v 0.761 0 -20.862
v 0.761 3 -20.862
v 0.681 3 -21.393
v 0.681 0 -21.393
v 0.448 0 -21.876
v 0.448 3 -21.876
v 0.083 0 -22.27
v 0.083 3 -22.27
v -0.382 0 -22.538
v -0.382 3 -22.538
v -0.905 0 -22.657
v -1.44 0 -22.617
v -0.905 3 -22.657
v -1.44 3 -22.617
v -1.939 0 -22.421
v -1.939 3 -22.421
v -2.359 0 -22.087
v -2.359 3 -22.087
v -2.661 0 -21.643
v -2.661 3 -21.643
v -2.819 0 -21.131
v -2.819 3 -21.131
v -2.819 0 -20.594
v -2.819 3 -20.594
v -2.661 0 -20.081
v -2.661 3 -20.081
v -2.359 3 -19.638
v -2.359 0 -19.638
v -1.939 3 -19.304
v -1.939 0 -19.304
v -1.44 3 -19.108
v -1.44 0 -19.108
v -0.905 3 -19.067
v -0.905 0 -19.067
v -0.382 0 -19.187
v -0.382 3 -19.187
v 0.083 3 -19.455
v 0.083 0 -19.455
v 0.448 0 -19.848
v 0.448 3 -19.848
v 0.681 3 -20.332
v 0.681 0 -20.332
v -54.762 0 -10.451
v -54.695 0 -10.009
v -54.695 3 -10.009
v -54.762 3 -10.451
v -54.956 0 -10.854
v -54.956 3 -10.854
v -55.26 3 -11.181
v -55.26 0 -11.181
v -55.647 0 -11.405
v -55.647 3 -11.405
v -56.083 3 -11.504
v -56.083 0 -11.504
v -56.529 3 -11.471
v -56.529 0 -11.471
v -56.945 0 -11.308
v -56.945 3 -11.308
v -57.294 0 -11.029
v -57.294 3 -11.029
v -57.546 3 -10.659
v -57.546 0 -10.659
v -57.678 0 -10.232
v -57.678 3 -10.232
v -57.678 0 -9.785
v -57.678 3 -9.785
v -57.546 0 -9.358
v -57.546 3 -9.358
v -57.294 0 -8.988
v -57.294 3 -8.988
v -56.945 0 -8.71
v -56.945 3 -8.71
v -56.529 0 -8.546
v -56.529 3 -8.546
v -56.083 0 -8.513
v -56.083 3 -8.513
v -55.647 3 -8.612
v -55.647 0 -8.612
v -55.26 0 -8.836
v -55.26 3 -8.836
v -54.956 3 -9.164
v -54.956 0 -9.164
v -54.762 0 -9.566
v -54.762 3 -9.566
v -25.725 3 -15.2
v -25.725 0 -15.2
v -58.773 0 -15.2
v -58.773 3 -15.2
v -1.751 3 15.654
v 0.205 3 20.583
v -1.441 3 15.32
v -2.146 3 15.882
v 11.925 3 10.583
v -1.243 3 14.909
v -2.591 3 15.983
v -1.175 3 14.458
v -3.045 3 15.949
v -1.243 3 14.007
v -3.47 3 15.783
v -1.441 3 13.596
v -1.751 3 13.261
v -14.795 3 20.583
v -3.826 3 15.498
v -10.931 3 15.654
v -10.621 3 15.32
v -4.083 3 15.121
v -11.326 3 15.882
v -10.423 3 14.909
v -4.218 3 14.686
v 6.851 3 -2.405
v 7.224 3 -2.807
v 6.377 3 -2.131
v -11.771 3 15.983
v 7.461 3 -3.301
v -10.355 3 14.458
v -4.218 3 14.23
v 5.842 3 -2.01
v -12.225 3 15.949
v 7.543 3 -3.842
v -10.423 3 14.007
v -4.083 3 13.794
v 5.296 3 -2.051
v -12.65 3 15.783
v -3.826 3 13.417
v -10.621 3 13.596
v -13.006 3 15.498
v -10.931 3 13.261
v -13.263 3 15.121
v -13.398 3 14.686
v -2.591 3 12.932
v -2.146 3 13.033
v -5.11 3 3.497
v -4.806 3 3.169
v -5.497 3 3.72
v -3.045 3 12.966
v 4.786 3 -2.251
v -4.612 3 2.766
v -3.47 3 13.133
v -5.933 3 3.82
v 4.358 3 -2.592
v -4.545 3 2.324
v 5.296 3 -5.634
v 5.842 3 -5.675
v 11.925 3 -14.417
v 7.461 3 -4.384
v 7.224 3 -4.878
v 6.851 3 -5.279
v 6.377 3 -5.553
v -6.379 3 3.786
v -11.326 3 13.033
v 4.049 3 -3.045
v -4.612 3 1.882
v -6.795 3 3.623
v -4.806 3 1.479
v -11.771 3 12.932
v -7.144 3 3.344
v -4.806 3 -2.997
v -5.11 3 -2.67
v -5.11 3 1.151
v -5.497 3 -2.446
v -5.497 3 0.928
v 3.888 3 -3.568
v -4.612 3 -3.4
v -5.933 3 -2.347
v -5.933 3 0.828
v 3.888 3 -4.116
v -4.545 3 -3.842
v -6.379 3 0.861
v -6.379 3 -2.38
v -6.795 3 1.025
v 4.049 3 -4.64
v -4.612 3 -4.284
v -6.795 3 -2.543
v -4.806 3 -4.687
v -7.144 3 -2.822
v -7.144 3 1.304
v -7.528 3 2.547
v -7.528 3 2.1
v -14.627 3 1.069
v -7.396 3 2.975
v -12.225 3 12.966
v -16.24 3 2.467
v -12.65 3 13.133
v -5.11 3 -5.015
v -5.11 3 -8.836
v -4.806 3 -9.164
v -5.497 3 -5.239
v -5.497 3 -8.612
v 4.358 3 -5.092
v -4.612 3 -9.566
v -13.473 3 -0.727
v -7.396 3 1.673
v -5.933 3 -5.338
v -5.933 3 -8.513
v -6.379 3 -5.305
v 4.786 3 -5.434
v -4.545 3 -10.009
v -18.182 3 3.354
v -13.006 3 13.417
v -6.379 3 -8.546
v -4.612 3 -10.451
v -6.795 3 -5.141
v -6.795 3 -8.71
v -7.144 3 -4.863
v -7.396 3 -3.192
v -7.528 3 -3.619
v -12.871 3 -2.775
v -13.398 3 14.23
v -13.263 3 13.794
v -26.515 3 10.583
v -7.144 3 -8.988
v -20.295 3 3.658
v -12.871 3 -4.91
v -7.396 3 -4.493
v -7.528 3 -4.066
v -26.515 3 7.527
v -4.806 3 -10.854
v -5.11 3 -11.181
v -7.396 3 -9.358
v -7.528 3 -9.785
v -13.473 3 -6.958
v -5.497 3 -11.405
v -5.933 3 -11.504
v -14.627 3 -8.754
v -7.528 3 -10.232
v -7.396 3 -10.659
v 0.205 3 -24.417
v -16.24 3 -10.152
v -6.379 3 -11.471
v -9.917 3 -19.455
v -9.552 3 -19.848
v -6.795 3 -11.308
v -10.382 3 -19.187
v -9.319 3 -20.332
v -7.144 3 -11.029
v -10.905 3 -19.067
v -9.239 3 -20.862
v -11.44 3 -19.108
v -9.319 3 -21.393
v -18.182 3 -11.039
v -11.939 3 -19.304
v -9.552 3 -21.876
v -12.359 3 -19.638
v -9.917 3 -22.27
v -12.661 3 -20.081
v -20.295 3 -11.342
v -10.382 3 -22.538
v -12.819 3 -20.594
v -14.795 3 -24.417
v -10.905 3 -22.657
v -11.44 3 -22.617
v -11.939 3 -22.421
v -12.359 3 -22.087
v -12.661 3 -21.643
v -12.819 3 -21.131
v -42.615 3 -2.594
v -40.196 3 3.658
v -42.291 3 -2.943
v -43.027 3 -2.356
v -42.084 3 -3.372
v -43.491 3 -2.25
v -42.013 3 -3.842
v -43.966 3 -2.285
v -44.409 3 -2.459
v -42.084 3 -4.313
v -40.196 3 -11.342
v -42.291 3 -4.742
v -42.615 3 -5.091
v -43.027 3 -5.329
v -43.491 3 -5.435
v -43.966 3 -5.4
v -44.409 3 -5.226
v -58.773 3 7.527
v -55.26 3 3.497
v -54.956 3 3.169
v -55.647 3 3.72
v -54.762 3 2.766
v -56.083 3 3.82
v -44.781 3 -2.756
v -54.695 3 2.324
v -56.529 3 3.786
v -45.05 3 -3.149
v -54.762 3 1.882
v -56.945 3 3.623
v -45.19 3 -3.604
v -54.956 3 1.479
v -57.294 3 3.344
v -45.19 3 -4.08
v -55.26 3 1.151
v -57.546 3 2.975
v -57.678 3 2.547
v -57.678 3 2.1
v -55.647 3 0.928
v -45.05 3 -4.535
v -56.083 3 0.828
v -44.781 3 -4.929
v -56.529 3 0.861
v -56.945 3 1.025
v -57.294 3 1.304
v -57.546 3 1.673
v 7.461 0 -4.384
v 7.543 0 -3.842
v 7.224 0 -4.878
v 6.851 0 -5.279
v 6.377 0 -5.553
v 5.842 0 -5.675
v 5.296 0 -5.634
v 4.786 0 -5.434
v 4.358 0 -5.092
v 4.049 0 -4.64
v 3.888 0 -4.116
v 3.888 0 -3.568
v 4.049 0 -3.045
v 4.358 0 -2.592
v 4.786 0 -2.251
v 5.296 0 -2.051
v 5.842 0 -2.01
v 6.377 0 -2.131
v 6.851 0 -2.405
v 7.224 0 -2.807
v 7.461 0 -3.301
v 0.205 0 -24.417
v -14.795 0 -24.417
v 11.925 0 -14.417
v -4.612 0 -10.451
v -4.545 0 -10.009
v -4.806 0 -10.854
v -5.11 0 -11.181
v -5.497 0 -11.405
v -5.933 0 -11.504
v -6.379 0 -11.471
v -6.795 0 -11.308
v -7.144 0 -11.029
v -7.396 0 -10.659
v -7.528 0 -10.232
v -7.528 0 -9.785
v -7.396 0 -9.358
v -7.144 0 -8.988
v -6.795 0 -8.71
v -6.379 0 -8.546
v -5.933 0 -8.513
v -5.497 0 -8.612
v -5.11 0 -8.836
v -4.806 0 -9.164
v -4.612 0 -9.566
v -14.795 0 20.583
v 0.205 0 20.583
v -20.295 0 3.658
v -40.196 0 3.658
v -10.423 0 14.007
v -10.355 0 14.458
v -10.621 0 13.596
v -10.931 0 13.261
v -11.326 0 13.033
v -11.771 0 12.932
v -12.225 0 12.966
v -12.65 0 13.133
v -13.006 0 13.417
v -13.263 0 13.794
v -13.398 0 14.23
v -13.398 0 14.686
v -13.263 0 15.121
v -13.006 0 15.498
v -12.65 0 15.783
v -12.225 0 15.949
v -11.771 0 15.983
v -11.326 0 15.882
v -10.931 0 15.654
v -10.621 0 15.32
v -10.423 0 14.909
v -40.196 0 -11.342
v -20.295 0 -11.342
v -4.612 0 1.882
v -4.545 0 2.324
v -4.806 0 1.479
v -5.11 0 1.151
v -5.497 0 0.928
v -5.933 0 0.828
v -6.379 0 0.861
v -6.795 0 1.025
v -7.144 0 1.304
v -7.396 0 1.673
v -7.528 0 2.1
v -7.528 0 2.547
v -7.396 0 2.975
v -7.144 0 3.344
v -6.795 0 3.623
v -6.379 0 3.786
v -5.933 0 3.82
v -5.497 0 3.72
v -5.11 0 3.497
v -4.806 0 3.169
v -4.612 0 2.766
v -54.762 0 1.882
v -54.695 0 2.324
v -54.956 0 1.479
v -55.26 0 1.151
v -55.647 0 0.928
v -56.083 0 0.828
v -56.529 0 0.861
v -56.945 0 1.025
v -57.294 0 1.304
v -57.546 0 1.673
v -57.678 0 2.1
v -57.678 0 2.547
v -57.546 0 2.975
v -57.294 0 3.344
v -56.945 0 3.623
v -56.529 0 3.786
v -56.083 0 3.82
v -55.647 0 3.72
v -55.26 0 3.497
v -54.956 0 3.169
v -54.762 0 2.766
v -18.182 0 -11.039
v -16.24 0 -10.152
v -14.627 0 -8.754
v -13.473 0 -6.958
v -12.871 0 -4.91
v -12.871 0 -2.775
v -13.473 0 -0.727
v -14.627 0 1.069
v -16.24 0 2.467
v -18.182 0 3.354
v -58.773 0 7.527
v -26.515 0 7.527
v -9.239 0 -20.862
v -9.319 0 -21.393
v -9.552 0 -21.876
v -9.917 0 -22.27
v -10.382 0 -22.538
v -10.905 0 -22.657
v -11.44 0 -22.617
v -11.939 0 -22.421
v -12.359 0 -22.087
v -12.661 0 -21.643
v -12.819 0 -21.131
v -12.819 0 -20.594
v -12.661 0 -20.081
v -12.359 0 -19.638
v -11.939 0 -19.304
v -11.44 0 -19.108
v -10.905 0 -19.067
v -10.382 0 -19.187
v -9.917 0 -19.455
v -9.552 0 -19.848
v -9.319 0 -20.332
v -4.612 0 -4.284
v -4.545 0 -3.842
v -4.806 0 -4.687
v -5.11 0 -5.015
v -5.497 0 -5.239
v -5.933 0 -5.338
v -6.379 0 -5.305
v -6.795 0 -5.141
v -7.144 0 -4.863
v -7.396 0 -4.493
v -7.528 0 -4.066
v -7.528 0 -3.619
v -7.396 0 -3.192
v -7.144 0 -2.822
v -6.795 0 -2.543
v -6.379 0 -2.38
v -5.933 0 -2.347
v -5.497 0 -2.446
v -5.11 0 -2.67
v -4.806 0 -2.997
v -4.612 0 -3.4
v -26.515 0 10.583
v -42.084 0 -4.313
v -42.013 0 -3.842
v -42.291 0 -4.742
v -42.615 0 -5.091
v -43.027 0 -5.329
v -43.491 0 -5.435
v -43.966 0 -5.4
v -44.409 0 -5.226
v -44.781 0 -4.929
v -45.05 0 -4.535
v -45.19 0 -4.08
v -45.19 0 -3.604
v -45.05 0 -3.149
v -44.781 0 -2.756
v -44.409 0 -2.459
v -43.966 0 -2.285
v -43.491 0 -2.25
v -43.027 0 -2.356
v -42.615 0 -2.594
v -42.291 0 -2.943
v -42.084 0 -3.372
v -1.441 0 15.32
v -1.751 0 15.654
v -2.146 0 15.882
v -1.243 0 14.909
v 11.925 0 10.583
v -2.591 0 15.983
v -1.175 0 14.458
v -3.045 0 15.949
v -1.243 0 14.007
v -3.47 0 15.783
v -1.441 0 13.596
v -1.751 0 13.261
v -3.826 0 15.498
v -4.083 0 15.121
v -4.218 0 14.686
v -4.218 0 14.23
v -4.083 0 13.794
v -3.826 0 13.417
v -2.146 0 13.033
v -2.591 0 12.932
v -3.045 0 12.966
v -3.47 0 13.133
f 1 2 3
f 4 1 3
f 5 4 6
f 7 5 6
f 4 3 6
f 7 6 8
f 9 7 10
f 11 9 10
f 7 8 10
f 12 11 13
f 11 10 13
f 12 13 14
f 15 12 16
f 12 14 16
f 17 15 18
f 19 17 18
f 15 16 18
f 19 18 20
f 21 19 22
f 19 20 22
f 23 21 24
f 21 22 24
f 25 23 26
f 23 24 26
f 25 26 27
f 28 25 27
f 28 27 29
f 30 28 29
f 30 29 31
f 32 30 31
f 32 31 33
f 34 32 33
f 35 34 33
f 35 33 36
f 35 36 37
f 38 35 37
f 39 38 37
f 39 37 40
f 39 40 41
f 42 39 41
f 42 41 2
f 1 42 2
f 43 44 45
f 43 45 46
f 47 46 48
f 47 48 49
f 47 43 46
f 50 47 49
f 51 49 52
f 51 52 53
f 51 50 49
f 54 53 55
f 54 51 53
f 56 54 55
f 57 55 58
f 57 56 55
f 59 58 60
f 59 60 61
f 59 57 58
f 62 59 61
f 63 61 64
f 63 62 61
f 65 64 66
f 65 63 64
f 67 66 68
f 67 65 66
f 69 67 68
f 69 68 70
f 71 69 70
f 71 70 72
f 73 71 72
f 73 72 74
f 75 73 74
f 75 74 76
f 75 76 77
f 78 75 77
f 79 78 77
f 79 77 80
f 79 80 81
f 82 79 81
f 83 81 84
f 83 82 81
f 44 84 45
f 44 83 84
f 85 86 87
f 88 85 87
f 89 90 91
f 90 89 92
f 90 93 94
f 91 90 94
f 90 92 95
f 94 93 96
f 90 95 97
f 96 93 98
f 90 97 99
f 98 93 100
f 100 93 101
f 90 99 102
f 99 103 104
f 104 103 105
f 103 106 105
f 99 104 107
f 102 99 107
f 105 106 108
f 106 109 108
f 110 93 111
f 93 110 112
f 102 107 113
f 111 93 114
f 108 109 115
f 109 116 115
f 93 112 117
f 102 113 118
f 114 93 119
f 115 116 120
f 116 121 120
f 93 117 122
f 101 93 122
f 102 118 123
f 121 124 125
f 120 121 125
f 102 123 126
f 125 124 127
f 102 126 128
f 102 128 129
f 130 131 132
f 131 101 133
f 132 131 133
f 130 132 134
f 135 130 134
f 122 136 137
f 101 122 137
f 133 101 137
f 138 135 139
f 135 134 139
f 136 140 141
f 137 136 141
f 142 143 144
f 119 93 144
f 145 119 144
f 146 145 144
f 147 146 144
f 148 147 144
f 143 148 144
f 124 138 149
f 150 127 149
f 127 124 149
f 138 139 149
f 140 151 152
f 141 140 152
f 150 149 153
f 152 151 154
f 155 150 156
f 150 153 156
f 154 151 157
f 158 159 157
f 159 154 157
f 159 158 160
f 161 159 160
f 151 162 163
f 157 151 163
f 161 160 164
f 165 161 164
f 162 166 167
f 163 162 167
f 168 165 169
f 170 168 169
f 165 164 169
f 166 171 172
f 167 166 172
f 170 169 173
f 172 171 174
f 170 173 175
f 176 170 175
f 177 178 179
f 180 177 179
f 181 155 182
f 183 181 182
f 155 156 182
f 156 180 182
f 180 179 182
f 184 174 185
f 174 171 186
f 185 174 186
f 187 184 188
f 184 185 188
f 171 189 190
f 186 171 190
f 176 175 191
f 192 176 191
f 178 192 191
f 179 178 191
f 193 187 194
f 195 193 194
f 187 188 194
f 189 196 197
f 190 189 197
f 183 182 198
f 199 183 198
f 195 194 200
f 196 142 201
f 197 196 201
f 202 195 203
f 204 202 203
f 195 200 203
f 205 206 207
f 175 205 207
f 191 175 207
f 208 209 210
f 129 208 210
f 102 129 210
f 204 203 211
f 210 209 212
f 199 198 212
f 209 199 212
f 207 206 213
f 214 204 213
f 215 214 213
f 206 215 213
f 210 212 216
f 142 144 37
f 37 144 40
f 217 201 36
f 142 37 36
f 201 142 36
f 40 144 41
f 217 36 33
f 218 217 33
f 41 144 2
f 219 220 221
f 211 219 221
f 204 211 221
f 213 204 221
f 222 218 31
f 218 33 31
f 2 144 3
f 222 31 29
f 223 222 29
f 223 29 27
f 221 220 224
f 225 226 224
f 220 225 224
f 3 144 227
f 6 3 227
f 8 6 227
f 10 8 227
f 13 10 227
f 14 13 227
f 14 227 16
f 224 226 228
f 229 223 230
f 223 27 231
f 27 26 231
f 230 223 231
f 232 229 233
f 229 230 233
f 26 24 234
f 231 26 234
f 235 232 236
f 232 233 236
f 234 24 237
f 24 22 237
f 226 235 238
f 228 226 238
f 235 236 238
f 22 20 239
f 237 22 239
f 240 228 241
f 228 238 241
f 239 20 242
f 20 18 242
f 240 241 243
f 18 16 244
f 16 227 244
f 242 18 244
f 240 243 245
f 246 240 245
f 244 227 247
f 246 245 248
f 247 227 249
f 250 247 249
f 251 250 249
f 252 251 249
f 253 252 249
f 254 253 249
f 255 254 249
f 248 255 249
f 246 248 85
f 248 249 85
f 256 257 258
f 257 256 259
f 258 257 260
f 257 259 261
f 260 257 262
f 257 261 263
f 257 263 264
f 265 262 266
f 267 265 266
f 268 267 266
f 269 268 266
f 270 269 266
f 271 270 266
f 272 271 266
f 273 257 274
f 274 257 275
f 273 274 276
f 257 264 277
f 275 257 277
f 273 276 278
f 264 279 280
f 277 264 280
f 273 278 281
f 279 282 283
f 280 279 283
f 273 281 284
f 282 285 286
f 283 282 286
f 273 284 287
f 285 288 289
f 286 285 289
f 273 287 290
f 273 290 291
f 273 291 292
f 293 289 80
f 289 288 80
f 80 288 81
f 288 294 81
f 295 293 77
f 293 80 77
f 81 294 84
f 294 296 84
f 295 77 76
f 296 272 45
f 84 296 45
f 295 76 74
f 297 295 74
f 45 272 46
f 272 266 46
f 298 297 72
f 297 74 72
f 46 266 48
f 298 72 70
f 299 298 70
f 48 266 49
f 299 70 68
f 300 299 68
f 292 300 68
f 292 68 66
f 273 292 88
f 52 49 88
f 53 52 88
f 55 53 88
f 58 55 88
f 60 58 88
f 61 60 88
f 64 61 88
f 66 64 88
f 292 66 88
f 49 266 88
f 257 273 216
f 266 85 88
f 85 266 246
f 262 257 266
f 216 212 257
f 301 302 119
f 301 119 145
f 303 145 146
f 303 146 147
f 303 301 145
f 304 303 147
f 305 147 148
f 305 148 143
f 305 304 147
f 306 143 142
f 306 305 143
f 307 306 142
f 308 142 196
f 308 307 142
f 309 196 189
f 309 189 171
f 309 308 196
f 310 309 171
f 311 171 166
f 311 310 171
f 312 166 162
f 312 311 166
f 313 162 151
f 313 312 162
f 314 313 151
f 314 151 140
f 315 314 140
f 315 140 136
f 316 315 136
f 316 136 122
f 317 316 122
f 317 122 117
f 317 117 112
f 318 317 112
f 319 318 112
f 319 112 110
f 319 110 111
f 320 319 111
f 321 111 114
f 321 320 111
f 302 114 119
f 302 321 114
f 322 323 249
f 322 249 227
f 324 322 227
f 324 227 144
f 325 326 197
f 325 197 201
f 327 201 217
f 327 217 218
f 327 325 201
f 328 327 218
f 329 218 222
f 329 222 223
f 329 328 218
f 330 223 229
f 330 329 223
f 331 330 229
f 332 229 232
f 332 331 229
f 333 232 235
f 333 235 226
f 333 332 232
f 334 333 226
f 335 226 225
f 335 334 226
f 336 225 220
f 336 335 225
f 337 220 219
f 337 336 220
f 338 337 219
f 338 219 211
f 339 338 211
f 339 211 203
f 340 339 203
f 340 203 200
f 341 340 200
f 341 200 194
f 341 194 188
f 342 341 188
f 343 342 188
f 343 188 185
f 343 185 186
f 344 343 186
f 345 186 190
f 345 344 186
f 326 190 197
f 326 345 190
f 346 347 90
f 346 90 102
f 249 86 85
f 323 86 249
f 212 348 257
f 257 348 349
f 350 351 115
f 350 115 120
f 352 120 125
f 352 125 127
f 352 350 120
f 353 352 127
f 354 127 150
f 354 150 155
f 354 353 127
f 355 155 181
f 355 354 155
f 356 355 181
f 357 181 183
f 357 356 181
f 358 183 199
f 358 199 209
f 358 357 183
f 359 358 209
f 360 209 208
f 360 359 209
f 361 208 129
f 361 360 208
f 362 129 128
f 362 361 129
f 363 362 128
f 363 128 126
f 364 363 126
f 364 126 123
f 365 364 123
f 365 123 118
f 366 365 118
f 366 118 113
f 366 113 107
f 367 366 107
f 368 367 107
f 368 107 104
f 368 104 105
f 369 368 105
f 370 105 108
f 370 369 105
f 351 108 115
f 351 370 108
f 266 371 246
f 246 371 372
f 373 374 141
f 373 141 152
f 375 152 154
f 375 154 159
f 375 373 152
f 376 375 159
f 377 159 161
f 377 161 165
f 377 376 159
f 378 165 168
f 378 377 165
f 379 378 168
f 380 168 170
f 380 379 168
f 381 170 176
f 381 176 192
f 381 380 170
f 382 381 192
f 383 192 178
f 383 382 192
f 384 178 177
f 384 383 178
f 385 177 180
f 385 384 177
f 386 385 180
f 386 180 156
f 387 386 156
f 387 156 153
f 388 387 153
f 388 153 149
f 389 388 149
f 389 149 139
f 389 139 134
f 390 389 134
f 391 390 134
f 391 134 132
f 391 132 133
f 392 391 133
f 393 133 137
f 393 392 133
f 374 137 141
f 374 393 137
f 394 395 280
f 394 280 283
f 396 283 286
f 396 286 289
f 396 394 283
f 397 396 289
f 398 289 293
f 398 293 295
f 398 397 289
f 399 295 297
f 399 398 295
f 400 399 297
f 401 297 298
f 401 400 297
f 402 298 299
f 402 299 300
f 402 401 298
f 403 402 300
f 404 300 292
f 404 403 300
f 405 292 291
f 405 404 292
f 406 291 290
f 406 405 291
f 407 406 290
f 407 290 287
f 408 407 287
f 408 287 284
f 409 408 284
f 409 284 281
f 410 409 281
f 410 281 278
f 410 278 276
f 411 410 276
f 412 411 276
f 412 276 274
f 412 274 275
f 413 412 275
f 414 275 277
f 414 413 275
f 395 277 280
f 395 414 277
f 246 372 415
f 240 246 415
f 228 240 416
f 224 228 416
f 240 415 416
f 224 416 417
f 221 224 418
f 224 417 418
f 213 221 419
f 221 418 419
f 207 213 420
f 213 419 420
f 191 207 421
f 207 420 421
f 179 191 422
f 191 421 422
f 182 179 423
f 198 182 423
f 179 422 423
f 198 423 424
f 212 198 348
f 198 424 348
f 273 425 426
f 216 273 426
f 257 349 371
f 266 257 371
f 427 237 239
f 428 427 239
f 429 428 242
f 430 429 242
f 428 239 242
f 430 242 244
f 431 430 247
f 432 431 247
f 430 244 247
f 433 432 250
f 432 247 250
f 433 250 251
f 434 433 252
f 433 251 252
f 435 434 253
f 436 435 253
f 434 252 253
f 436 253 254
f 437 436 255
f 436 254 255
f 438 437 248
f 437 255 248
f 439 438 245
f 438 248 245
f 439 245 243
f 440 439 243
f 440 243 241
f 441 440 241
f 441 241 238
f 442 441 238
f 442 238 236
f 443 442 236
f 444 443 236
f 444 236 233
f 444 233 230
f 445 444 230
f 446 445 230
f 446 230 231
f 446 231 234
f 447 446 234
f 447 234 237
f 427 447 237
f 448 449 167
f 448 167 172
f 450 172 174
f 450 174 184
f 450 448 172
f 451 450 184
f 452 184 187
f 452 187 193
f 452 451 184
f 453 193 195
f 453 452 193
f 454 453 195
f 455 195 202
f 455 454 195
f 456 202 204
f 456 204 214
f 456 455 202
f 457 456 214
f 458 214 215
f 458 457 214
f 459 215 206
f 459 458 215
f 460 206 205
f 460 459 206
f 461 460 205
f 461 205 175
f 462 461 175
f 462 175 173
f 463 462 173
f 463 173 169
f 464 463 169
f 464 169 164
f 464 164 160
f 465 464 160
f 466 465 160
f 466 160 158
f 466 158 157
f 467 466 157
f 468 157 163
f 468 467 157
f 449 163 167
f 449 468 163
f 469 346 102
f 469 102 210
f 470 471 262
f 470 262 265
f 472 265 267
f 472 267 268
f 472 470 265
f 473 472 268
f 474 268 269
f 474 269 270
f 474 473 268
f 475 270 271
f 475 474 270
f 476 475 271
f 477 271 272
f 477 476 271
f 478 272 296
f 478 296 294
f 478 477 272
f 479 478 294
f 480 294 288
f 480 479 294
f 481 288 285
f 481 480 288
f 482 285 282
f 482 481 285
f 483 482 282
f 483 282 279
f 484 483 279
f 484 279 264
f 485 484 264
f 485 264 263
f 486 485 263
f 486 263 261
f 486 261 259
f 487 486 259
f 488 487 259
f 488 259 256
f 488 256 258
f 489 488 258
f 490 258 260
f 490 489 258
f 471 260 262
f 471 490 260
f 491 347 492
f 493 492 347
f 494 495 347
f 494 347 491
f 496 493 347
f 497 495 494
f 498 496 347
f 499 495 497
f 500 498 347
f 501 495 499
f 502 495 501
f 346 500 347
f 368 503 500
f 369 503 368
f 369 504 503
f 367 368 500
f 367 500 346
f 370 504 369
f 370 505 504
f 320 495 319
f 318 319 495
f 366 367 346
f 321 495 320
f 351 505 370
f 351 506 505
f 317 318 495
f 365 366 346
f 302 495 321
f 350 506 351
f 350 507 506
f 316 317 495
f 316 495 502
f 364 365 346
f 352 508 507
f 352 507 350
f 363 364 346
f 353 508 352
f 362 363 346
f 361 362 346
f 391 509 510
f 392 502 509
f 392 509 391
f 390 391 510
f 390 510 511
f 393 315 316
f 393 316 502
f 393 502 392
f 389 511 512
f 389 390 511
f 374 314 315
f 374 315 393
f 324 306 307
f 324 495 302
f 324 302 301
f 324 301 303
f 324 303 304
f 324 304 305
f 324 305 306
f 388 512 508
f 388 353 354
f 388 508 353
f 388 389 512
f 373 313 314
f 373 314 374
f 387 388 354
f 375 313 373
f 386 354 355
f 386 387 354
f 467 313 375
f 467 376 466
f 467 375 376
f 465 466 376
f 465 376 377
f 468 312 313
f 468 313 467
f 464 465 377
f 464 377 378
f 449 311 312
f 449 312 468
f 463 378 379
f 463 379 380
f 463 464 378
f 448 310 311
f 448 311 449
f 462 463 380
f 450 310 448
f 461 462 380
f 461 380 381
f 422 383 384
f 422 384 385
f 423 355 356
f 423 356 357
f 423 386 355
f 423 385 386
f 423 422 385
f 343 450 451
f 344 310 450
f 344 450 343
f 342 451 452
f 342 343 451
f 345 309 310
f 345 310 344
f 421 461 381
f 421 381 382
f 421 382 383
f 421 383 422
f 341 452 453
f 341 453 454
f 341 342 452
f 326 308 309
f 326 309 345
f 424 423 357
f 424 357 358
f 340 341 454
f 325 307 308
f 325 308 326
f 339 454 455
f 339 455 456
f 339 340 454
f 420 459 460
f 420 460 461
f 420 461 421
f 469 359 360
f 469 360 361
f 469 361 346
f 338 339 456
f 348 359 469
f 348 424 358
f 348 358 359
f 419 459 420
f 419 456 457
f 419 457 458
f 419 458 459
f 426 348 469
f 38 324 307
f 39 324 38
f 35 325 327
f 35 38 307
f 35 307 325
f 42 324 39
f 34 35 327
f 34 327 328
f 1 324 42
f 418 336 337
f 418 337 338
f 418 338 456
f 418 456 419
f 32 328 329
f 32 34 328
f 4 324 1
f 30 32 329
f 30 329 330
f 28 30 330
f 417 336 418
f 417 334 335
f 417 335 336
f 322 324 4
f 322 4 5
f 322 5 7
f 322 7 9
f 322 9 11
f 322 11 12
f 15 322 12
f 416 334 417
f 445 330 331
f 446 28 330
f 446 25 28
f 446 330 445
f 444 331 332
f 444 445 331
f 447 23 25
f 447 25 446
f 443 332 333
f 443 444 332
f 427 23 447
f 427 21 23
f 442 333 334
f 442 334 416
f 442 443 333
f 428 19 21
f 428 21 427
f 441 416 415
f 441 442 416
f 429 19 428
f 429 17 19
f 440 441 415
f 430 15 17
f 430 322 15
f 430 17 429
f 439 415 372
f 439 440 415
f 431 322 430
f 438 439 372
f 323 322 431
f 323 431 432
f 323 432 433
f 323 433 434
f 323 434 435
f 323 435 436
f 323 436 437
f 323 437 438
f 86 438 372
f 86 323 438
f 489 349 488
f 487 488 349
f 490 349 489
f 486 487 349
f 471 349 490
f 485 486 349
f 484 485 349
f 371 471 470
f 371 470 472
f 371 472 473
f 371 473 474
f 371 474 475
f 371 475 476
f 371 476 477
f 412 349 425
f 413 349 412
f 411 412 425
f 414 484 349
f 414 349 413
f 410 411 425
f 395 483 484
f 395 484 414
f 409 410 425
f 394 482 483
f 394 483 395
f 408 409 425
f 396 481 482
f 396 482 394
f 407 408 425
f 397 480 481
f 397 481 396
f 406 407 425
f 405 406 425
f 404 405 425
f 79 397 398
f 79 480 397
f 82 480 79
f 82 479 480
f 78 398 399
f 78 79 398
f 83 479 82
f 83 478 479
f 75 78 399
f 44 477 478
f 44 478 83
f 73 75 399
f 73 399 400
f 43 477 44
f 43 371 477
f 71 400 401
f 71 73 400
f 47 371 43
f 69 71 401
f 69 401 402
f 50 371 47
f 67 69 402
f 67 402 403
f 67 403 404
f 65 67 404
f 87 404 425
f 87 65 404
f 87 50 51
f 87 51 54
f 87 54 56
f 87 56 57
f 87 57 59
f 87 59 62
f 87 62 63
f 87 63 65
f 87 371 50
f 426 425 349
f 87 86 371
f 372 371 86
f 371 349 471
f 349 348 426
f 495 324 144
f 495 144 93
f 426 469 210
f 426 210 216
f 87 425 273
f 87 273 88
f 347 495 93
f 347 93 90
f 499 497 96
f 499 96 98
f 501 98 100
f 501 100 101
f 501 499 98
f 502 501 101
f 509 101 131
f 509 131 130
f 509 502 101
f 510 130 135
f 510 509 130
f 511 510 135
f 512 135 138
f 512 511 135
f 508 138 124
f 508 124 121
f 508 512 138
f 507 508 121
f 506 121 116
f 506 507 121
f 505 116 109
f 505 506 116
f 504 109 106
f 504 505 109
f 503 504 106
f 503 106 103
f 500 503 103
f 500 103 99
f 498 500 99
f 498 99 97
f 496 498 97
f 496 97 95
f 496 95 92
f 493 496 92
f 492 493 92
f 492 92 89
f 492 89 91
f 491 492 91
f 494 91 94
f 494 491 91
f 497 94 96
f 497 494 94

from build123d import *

# Parameters (mm, degrees)
CROQUIS1_R              = 1.53
CROQUIS1_R_2            = 1.837919526
CROQUIS1_R_3            = 1.597275243
CROQUIS1_R_4            = 1.5
SALIENTE_EXTRUIR1_DEPTH = 3
CROQUIS2_R              = 1.8
CORTAR_EXTRUIR1_DEPTH   = 10


with BuildPart() as part:
    # Croquis1 → Saliente-Extruir1 (new body)
    with BuildSketch(Plane(origin=(0, 0, 0), x_dir=(1, 0, 0), z_dir=(0, 1, 0))):
        Polygon((-26.514888395, -10.582637626), (-26.514888395, -7.527182045), (-40.886979894, -7.527182045), (-58.77250276, -7.527182045), (-58.77250276, 15.200062733), (-41.405808266, 15.200062733), (-25.724953766, 15.200062733), (-14.794888395, 24.417362374), (0.205111605, 24.417362374), (11.925111605, 14.417362374), (11.925111605, -10.582637626), (0.205111605, -20.582637626), (-14.794888395, -20.582637626), align=None)
        with Locations((-11.884888395, -14.457637626)):
            Circle(CROQUIS1_R, mode=Mode.SUBTRACT)
        with Locations((-2.704888395, -14.457637626)):
            Circle(CROQUIS1_R, mode=Mode.SUBTRACT)
        with Locations((5.705111605, 3.842362374)):
            Circle(CROQUIS1_R_2, mode=Mode.SUBTRACT)
        with Locations((-43.610544187, 3.842362374)):
            Circle(CROQUIS1_R_3, mode=Mode.SUBTRACT)
        with Locations((-6.044888395, 3.842362374)):
            Circle(CROQUIS1_R_4, mode=Mode.SUBTRACT)
        with Locations((-6.044888395, 10.008584025)):
            Circle(CROQUIS1_R_4, mode=Mode.SUBTRACT)
        with Locations((-6.044888395, -2.323859276)):
            Circle(CROQUIS1_R_4, mode=Mode.SUBTRACT)
        with Locations((-56.194888395, 10.008584025)):
            Circle(CROQUIS1_R_4, mode=Mode.SUBTRACT)
        with Locations((-56.194888395, -2.323859276)):
            Circle(CROQUIS1_R_4, mode=Mode.SUBTRACT)
        with BuildLine():
            Line((-40.195554385, 11.342362374), (-20.294888395, 11.342362374))
            ThreePointArc((-20.294888395, 11.342362374), (-12.794888395, 3.842362374), (-20.294888395, -3.657637626))
            Line((-20.294888395, -3.657637626), (-40.195554385, -3.657637626))
            Line((-40.195554385, -3.657637626), (-40.195554385, 11.342362374))
        make_face(mode=Mode.SUBTRACT)
    extrude(amount=SALIENTE_EXTRUIR1_DEPTH)

    # Croquis2 → Cortar-Extruir1 (cut)
    with BuildSketch(Plane(origin=(0, 3, 0), x_dir=(1, 0, 0), z_dir=(0, 1, 0))):
        with Locations((-11.039224955, 20.862391136)):
            Circle(CROQUIS2_R)
        with Locations((-1.039224955, 20.862391136)):
            Circle(CROQUIS2_R)
    extrude(amount=-CORTAR_EXTRUIR1_DEPTH, mode=Mode.SUBTRACT)


solid = part.part
